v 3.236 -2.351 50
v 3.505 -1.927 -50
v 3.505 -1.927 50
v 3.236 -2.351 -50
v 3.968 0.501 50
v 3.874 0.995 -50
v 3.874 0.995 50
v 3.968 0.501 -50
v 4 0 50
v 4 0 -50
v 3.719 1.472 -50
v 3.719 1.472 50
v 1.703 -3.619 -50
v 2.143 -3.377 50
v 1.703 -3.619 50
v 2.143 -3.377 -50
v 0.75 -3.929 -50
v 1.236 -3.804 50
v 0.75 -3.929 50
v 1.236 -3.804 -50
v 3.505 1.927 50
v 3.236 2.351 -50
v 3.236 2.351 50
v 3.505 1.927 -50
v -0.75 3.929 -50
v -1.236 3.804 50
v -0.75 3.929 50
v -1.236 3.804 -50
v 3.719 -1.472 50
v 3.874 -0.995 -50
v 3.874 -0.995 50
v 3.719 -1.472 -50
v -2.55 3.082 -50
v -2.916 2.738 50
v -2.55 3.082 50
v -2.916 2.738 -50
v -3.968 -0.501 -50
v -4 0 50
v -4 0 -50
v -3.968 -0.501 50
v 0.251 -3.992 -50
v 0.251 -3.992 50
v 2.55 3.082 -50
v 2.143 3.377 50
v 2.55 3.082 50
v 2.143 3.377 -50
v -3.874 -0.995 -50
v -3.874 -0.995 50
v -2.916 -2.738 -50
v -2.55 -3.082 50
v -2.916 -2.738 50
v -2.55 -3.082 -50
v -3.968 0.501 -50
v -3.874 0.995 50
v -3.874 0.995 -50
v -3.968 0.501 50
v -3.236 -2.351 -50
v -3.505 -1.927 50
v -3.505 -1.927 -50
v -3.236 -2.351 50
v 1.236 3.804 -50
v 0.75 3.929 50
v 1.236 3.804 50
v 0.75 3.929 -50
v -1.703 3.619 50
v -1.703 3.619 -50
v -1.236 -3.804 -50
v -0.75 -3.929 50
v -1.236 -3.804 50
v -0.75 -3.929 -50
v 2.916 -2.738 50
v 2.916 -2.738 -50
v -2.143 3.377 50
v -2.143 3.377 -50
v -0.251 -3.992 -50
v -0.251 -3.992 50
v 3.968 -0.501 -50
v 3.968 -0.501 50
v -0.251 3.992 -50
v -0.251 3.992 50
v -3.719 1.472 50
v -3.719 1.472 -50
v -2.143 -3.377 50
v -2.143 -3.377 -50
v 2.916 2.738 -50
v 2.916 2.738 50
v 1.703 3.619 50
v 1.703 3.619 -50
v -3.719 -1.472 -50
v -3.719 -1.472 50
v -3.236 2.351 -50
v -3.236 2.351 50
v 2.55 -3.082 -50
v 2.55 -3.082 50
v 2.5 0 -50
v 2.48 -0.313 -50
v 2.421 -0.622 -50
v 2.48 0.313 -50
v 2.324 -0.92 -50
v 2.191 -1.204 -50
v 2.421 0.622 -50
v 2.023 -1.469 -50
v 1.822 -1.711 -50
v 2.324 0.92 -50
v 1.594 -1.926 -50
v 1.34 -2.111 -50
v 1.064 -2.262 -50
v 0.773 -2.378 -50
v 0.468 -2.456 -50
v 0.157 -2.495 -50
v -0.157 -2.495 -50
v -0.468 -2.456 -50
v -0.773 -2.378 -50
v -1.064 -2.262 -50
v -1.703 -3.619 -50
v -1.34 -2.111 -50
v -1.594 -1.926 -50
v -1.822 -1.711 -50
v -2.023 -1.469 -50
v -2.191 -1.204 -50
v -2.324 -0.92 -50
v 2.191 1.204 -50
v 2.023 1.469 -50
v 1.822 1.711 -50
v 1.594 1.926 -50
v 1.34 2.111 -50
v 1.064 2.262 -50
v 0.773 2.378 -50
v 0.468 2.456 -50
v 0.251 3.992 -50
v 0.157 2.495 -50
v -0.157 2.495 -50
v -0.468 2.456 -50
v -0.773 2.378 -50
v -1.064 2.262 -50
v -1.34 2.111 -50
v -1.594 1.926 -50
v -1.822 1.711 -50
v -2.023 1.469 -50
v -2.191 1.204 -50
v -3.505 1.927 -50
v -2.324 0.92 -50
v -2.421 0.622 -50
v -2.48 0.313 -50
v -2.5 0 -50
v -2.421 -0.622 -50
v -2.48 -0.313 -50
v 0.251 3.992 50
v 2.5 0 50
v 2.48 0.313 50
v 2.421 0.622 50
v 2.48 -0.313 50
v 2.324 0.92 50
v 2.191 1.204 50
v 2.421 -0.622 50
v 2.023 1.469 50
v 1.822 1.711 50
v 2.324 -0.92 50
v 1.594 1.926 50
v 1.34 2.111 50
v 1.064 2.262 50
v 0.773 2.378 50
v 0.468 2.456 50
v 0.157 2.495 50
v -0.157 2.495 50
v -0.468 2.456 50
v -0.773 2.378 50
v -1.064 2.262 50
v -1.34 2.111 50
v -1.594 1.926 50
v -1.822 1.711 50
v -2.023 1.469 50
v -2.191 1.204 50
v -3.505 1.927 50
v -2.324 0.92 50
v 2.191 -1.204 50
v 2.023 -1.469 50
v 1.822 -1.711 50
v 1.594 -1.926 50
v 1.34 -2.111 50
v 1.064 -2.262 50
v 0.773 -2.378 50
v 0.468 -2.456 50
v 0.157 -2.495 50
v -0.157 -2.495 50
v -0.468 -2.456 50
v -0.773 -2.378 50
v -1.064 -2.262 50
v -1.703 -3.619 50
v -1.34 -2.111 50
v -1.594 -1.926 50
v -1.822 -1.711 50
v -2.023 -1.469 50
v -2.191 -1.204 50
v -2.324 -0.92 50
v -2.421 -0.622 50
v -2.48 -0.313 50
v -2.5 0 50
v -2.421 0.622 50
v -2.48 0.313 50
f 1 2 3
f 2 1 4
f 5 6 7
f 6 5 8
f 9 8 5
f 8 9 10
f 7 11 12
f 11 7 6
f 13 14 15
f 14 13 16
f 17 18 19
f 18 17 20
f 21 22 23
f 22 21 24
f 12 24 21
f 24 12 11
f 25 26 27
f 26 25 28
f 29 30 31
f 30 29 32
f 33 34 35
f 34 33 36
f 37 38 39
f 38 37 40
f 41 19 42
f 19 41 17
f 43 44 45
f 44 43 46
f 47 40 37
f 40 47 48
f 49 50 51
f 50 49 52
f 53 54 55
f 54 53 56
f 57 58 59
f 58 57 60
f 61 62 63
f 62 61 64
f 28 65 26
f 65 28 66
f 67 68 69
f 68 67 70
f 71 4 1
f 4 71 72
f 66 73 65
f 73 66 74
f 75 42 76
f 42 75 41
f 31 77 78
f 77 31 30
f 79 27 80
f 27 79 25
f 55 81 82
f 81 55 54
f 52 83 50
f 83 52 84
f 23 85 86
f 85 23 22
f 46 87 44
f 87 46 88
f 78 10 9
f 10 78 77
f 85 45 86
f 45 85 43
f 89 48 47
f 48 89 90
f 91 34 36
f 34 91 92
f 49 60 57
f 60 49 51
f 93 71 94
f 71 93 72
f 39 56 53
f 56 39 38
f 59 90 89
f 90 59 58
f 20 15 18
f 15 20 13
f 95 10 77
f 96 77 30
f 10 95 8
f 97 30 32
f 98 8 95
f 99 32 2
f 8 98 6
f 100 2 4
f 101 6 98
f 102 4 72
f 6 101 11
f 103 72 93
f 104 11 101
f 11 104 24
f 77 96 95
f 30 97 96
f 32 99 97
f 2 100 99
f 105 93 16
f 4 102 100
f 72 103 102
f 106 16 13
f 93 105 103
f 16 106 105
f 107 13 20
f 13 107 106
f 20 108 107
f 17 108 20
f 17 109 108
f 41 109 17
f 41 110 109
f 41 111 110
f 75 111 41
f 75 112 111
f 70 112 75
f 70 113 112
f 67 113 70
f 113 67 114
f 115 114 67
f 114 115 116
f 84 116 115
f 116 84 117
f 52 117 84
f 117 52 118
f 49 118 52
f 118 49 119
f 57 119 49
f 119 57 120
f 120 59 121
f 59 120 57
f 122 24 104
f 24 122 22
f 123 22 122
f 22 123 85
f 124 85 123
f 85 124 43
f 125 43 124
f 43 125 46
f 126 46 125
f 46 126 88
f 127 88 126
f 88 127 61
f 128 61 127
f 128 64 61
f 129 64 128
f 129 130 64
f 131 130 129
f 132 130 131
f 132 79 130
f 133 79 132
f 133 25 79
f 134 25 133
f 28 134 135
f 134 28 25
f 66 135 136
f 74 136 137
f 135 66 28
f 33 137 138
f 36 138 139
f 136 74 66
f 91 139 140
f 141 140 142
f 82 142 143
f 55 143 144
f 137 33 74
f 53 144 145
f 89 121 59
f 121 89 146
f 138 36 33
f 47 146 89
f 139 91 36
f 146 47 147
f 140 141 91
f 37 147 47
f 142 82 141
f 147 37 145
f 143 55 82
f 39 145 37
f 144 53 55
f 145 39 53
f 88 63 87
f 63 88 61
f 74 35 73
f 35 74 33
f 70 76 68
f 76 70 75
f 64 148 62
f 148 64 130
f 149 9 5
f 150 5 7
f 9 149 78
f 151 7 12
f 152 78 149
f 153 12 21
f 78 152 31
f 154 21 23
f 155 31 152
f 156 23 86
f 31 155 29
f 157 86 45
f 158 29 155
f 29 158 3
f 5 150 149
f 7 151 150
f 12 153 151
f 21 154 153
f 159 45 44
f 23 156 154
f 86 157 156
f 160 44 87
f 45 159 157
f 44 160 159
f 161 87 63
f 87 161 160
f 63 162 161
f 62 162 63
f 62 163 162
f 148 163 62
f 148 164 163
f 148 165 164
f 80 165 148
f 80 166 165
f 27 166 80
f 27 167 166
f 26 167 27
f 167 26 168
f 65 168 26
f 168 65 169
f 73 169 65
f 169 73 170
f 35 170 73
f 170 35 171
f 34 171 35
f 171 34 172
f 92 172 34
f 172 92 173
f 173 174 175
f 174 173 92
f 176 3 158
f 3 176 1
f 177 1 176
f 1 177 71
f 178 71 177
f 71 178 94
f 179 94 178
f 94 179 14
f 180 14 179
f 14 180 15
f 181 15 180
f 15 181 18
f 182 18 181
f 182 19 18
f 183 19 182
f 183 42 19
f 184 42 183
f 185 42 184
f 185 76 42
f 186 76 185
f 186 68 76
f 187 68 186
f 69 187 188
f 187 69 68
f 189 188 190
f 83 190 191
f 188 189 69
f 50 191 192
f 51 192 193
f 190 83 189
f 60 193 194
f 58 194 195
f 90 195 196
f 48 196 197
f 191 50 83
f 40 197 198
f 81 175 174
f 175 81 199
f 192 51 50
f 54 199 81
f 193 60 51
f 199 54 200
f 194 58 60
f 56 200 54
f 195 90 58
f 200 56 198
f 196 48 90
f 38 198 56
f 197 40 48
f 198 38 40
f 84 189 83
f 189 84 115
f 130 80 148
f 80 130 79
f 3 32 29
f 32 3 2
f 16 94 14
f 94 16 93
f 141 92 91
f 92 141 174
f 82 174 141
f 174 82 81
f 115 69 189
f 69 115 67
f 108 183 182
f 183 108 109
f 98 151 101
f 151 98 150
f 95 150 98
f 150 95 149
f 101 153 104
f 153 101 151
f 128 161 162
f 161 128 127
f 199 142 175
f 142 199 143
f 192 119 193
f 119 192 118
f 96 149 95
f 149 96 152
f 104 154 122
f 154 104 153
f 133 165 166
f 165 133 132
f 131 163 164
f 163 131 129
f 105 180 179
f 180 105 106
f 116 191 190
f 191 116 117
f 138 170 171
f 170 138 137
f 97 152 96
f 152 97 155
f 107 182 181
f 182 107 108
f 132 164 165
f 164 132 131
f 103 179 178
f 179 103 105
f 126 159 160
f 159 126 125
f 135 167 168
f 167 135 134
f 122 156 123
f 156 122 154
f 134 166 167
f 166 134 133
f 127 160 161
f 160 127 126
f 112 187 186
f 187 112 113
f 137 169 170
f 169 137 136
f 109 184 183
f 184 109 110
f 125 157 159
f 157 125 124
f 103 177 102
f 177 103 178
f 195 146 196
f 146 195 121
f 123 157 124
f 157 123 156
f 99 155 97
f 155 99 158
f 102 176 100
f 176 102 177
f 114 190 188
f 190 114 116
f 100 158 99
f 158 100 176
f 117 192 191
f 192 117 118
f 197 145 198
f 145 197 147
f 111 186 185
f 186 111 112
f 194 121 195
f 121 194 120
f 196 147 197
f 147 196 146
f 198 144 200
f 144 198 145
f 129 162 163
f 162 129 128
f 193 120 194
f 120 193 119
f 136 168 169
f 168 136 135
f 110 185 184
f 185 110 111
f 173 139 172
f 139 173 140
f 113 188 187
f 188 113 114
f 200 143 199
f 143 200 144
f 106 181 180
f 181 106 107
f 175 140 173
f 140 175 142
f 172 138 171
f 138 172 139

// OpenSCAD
$fn = 50;


difference() {
	union() {
		translate(v = [0, 0, -50.0000000000]) {
			cylinder(h = 100, r = 4.0000000000);
		}
	}
	union() {
		translate(v = [0, 0, -100.0000000000]) {
			cylinder(h = 200, r = 2.5000000000);
		}
	}
}
